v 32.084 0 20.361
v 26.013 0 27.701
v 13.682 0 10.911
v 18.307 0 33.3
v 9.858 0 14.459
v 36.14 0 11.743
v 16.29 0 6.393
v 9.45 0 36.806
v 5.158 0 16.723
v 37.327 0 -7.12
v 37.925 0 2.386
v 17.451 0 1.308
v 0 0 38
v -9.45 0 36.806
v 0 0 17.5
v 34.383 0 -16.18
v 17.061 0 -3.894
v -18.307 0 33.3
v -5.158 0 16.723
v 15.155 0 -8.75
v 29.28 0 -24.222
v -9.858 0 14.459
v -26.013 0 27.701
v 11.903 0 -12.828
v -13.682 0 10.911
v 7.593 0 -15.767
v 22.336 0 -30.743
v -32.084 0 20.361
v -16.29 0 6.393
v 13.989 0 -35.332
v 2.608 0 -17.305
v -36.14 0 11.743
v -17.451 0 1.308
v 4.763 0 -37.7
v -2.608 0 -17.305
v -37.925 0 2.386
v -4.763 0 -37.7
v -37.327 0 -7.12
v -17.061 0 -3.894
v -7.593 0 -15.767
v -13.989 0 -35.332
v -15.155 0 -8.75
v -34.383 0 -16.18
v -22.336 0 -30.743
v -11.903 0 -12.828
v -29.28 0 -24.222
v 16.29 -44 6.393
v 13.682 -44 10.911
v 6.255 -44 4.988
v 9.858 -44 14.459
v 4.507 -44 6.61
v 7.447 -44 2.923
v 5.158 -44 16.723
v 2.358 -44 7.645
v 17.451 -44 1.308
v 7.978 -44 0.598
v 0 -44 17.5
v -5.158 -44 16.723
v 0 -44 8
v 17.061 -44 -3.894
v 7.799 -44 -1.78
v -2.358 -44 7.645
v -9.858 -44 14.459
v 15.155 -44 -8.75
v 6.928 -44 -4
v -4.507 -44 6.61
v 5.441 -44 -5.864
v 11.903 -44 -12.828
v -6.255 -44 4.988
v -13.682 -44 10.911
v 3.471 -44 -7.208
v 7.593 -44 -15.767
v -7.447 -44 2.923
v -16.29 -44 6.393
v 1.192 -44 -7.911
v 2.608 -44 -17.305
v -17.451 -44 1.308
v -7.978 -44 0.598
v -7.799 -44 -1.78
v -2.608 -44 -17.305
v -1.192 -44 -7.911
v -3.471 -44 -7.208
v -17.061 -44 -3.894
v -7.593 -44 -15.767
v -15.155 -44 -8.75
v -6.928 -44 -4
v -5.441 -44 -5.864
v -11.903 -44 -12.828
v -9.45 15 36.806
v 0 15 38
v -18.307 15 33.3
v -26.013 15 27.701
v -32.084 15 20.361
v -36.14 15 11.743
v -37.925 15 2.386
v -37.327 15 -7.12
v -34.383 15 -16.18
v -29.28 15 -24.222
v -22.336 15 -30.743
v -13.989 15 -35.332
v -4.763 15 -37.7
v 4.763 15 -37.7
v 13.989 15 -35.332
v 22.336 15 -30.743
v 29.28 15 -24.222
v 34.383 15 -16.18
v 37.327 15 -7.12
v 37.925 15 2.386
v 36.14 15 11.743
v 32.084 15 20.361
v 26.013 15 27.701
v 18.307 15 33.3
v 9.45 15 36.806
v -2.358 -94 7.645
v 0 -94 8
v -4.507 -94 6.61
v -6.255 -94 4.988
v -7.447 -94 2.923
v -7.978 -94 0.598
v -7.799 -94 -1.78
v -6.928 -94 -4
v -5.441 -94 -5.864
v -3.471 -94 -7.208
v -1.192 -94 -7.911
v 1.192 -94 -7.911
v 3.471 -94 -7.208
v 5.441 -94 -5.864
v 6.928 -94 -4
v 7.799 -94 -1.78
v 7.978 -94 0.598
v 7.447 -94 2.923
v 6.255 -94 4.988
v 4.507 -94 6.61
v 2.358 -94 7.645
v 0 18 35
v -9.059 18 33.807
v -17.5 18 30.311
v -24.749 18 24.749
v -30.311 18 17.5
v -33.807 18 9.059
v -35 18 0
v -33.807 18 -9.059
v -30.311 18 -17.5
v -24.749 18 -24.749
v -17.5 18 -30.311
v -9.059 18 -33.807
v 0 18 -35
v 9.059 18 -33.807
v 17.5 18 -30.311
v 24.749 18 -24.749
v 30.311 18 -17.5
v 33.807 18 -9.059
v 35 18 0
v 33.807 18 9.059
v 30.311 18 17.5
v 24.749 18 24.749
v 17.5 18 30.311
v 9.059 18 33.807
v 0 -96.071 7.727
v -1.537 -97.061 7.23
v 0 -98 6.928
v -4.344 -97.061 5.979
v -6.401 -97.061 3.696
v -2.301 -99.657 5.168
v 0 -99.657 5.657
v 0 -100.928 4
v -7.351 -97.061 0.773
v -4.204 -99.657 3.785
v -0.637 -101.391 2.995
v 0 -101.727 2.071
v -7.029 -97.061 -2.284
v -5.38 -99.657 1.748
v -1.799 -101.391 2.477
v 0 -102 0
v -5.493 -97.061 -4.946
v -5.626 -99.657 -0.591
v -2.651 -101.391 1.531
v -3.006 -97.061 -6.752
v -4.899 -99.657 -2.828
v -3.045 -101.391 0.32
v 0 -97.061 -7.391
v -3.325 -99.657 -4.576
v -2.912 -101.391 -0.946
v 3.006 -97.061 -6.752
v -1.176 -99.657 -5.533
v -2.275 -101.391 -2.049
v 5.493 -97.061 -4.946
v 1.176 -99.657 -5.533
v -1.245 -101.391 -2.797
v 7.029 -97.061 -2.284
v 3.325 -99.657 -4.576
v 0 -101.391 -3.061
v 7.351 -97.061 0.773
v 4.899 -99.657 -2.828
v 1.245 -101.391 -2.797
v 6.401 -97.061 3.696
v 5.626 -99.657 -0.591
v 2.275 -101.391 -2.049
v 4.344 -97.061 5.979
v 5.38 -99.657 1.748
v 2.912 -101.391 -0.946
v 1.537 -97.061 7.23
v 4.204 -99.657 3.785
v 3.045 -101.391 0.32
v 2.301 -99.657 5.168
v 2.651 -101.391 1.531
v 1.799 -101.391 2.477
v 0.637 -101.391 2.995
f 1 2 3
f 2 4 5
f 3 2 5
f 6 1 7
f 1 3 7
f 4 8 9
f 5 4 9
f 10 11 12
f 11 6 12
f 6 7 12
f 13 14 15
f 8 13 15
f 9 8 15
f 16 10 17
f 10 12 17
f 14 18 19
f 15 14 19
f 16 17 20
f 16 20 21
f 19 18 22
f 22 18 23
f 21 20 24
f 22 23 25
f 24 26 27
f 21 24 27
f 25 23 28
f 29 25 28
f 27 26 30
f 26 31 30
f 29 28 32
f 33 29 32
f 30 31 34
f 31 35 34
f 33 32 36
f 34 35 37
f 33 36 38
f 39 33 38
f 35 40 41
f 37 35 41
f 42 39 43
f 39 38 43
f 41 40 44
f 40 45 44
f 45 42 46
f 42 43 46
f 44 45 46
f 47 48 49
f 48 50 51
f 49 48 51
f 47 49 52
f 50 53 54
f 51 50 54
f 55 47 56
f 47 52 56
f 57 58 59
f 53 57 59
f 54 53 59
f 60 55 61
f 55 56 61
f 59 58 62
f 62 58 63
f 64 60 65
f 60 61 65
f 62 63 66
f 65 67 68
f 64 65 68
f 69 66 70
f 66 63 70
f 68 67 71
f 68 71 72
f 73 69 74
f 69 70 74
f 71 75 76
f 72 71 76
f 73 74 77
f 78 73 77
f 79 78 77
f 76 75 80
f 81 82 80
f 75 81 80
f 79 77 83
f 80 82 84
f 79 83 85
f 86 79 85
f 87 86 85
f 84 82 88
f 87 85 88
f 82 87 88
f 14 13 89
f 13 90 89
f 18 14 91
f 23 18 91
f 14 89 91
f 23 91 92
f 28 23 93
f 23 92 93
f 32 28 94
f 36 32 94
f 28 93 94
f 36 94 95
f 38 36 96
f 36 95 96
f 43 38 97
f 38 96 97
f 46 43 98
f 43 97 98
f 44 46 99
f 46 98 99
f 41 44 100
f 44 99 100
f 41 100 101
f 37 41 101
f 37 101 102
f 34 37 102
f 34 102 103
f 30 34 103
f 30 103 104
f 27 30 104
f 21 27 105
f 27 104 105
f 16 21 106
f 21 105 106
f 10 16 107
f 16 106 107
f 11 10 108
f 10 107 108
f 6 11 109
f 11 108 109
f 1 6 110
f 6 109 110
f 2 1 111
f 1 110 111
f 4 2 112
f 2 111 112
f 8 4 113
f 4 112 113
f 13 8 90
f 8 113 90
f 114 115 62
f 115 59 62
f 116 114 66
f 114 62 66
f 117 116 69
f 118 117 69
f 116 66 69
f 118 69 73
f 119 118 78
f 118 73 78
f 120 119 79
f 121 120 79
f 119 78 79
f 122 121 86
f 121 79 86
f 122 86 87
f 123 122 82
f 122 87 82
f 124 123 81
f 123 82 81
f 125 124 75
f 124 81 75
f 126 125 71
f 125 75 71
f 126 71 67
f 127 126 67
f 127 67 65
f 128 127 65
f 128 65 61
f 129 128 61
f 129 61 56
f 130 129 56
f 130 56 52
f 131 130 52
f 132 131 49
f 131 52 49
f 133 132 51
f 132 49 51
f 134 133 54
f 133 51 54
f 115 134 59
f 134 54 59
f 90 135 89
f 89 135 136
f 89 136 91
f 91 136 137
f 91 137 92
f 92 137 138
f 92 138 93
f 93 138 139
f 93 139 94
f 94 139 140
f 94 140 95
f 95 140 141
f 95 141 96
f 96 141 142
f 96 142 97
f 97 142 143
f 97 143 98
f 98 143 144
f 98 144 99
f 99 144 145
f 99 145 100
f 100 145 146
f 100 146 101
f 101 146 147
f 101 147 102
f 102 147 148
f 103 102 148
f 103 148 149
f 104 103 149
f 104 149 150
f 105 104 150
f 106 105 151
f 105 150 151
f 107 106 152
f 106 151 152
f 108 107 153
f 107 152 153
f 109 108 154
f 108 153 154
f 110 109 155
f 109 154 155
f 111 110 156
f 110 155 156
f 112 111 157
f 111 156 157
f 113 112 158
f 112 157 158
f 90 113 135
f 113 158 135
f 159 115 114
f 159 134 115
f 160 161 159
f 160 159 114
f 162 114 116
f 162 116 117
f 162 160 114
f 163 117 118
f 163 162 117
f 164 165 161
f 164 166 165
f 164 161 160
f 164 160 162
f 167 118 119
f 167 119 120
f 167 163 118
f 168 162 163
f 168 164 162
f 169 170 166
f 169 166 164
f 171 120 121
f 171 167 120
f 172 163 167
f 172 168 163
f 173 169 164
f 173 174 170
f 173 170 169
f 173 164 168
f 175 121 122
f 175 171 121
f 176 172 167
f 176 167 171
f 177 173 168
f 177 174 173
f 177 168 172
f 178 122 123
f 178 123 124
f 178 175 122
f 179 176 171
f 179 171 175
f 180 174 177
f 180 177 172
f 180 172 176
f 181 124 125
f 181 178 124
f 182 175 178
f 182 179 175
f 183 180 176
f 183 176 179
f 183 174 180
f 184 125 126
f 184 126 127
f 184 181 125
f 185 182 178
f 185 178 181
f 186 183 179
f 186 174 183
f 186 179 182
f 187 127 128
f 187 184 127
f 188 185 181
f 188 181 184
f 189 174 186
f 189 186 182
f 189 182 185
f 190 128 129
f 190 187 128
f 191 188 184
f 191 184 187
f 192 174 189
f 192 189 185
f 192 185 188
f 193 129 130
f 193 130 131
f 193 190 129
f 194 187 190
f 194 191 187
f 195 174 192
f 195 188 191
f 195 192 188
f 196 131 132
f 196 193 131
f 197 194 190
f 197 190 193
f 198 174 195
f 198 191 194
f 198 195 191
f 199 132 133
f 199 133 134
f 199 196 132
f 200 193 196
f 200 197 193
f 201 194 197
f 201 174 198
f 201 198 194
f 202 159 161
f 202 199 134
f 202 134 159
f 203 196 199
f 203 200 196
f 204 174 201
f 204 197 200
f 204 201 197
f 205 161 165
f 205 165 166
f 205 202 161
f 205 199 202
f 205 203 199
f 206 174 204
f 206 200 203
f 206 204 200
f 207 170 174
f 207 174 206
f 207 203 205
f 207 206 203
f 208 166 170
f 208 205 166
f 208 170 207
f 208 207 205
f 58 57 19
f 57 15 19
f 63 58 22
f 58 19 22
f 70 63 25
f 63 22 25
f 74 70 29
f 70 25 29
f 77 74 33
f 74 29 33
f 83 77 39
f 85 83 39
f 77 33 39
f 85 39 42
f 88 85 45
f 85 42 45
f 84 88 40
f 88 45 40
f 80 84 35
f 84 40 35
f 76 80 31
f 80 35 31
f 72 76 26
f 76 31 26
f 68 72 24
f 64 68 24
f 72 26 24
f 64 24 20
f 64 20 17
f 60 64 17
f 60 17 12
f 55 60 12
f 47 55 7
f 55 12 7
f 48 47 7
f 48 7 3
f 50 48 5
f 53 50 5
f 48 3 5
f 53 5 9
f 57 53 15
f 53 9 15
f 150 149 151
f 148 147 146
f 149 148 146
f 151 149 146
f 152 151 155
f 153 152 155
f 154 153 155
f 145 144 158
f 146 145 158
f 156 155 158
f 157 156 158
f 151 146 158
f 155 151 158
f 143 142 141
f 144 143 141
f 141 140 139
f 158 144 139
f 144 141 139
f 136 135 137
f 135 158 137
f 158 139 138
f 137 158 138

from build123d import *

# Parameters (mm, degrees)
SKETCH1_W = 8
SKETCH1_H = 50


with BuildPart() as part:
    # Sketch1 → Revolve1 (revolve)
    with BuildSketch(Plane.XY, mode=Mode.PRIVATE) as revolve1_sk:
        Polygon((35, 18), (0, 18), (0, 15), (38, 15), align=None)
        Polygon((38, 15), (0, 15), (0, 0), (17.5, 0), (38, 0), align=None)
        Polygon((17.5, 0), (0, 0), (0, -44), (8, -44), (17.5, -44), align=None)
        with Locations((4, -69)):
            Rectangle(SKETCH1_W, SKETCH1_H)
        with BuildLine():
            ThreePointArc((8, -94), (5.656854249, -99.656854249), (0, -102))
            Line((0, -102), (0, -94))
            Line((0, -94), (8, -94))
        make_face()
    revolve(revolve1_sk.sketch.rotate(Axis((0, 67.717923126, 0), (0, -1, 0)), 90), axis=Axis((0, 67.717923126, 0), (0, -1, 0)))


solid = part.part
